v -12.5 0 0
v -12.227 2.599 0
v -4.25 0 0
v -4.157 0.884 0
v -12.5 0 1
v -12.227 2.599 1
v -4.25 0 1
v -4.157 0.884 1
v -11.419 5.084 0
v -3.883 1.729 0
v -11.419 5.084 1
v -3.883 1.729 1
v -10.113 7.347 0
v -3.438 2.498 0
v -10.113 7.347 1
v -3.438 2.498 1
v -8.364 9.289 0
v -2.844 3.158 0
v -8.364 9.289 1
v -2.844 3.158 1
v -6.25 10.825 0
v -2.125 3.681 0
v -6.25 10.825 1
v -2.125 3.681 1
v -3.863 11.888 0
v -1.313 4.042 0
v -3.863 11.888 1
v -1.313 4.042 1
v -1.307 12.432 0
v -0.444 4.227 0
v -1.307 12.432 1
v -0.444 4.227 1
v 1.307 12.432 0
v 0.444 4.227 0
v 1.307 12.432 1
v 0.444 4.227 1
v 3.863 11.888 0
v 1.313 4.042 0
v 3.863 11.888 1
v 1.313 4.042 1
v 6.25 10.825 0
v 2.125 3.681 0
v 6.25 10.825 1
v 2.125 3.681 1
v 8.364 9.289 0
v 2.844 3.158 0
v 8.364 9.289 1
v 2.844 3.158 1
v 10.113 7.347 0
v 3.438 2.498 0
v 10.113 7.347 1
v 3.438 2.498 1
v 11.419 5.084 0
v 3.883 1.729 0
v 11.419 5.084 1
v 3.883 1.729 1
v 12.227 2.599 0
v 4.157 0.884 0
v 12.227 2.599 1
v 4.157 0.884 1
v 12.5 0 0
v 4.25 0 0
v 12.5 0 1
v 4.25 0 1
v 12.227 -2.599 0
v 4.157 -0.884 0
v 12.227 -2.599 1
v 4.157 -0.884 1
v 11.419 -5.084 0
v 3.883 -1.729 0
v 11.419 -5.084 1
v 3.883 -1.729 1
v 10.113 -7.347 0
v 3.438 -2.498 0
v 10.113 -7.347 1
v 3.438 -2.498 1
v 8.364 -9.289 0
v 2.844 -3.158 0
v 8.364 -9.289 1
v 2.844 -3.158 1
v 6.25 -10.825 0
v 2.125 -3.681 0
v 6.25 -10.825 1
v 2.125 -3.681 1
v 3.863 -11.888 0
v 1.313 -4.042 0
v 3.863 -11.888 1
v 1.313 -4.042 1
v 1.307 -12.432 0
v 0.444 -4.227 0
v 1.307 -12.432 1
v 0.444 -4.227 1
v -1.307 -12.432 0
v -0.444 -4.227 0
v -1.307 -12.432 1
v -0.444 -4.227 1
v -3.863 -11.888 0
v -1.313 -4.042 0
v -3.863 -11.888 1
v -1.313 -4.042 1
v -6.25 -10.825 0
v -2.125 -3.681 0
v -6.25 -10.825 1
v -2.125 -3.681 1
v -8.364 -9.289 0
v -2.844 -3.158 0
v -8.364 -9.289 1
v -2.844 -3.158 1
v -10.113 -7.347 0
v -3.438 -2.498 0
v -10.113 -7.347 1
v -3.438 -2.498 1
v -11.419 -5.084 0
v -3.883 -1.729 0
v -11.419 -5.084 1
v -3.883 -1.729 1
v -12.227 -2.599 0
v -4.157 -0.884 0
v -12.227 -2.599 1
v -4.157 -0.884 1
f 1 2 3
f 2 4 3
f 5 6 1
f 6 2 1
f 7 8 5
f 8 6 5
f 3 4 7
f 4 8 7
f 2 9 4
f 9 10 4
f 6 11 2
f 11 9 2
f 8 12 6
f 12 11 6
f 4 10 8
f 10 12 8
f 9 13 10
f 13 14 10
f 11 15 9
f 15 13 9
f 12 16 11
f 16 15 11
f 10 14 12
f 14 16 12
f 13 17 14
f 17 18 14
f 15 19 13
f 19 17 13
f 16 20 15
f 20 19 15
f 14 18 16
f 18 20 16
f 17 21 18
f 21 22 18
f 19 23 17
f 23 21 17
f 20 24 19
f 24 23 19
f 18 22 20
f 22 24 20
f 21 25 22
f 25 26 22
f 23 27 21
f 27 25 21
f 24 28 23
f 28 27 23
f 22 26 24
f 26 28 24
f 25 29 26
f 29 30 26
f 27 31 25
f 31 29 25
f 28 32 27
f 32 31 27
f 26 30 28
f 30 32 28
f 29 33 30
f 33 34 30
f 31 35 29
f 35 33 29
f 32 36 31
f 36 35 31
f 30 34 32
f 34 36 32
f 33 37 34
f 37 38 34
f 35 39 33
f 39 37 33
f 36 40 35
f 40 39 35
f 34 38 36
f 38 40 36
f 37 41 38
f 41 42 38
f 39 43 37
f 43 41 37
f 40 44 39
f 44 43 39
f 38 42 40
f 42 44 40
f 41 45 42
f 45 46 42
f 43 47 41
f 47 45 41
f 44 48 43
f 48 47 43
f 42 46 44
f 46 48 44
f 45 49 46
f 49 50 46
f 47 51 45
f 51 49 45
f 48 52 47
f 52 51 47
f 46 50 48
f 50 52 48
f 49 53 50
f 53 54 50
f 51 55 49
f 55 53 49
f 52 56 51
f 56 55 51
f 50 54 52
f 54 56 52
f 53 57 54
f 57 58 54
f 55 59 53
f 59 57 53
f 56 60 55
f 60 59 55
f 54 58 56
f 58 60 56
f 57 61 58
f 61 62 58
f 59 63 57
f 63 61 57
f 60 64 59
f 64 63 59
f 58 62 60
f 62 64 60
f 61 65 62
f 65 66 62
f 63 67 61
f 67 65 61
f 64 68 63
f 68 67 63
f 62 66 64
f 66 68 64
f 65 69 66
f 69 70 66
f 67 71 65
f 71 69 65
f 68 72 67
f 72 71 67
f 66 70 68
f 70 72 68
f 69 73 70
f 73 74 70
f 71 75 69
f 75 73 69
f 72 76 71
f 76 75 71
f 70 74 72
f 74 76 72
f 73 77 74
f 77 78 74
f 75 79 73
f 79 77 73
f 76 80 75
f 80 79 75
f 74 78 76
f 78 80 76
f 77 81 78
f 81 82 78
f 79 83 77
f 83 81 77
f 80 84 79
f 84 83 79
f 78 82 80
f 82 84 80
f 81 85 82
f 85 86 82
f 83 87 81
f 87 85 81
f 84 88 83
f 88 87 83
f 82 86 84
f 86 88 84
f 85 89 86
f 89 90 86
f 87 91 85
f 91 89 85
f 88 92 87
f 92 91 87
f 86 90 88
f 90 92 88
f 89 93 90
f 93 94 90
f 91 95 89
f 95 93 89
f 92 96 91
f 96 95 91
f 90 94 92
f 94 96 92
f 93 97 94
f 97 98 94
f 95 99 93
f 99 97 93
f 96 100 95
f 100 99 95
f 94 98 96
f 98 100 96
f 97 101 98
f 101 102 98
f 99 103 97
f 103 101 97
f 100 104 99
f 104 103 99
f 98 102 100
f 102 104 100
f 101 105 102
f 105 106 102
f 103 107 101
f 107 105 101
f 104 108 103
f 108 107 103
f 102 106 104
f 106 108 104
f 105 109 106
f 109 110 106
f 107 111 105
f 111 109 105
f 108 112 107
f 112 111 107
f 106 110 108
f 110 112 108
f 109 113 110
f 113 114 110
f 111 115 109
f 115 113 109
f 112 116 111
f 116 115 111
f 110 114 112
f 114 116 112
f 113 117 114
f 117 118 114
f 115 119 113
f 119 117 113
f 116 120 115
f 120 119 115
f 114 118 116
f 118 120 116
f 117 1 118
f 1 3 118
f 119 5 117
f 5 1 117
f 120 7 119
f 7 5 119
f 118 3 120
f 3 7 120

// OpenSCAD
// file: ../../common/circle_sector.scad
module circle_sector(r = 0, d = 0, a = [0, 180]) {
    r = max(r, d / 2);
    sector_r = r / cos(180 / $fn);
    step = -360 / $fn;

    points = concat([[0, 0]],
        [for(a = [a[0] : step : a[1] - 360])
            [sector_r * cos(a), sector_r * sin(a)]
        ],
        [[sector_r * cos(a[1]), sector_r * sin(a[1])]]
    );

    difference() {
        circle(r);
        polygon(points);
    }
}

circle_sector();
// file: led_balloon_light_holder.scad
// Mini LED balloon light holder, e.g to stand it on a desk or in an angle. As it is round, it would not
// stand on its own.
// https://www.amazon.de/-/en/gp/product/B0CMZFZDGG

use <../../common/circle_sector.scad>;

function horizontal_d() = 13.7; // mm
function vertical_d() = 12; // it is not a perfect circle, but a bit squished, just like Earth
function wall_thickness() = 1.0; // mm

function switch_slot_w() = 8.5; // mm
function switch_slot_d() = 1.0; // mm

module led_balloon_ellypse(d) {
    ellypse_factor = vertical_d() / horizontal_d();

    scale([1, ellypse_factor]) {
        difference() {
            circle_sector(d = d, a = [-90, 15]);
        }
    }
}

module led_balloon_light_holder() {
    horizonal_r = horizontal_d() / 2;
    vertical_r = vertical_d() / 2;

    ellypse_inner_d = horizontal_d();
    ellypse_outer_d = horizontal_d() + wall_thickness() * 2;

    offset_y = vertical_r + wall_thickness();

    difference() {
        rotate_extrude() {
            difference() {
                hull() {
                    translate([0, offset_y]) led_balloon_ellypse(ellypse_inner_d);
                    translate([7.0, 8]) square(0.1);
                    translate([8, 6]) square(0.1);
                    translate([horizonal_r / 2 + 1, 0]) square(0.1);
                    square(0.1);
                }
                translate([0, offset_y]) led_balloon_ellypse(ellypse_inner_d);
            }
        }
        translate([0, 0, 1]) cube([switch_slot_w(), switch_slot_d(), 4], center = true); // bottom slot for switch

        for (i = [0 : 45 : 135]) {
            rotate([0, 0, i]) translate([0, 0, vertical_r + 0.5]) cube([horizontal_d() + 5, 1, 5], center = true); // top slot for switch
        }
    }
}

led_balloon_light_holder();
// main file
use <led_balloon_light_holder.scad>;

function baseplate_d() = 25; // mm

module led_balloon_light_holder_large_baseplate(d = baseplate_d()) {
    ellypse_outer_d = horizontal_d() + wall_thickness() * 2;
    ellypse_inner_d = horizontal_d();

    offset_x = switch_slot_w() / 2;
    square_x = baseplate_d() / 2 - offset_x;

    union(){
        led_balloon_light_holder();
        rotate_extrude() {
            translate([offset_x, 0]) square([square_x, 1]);
        }
    }
}

led_balloon_light_holder_large_baseplate();
